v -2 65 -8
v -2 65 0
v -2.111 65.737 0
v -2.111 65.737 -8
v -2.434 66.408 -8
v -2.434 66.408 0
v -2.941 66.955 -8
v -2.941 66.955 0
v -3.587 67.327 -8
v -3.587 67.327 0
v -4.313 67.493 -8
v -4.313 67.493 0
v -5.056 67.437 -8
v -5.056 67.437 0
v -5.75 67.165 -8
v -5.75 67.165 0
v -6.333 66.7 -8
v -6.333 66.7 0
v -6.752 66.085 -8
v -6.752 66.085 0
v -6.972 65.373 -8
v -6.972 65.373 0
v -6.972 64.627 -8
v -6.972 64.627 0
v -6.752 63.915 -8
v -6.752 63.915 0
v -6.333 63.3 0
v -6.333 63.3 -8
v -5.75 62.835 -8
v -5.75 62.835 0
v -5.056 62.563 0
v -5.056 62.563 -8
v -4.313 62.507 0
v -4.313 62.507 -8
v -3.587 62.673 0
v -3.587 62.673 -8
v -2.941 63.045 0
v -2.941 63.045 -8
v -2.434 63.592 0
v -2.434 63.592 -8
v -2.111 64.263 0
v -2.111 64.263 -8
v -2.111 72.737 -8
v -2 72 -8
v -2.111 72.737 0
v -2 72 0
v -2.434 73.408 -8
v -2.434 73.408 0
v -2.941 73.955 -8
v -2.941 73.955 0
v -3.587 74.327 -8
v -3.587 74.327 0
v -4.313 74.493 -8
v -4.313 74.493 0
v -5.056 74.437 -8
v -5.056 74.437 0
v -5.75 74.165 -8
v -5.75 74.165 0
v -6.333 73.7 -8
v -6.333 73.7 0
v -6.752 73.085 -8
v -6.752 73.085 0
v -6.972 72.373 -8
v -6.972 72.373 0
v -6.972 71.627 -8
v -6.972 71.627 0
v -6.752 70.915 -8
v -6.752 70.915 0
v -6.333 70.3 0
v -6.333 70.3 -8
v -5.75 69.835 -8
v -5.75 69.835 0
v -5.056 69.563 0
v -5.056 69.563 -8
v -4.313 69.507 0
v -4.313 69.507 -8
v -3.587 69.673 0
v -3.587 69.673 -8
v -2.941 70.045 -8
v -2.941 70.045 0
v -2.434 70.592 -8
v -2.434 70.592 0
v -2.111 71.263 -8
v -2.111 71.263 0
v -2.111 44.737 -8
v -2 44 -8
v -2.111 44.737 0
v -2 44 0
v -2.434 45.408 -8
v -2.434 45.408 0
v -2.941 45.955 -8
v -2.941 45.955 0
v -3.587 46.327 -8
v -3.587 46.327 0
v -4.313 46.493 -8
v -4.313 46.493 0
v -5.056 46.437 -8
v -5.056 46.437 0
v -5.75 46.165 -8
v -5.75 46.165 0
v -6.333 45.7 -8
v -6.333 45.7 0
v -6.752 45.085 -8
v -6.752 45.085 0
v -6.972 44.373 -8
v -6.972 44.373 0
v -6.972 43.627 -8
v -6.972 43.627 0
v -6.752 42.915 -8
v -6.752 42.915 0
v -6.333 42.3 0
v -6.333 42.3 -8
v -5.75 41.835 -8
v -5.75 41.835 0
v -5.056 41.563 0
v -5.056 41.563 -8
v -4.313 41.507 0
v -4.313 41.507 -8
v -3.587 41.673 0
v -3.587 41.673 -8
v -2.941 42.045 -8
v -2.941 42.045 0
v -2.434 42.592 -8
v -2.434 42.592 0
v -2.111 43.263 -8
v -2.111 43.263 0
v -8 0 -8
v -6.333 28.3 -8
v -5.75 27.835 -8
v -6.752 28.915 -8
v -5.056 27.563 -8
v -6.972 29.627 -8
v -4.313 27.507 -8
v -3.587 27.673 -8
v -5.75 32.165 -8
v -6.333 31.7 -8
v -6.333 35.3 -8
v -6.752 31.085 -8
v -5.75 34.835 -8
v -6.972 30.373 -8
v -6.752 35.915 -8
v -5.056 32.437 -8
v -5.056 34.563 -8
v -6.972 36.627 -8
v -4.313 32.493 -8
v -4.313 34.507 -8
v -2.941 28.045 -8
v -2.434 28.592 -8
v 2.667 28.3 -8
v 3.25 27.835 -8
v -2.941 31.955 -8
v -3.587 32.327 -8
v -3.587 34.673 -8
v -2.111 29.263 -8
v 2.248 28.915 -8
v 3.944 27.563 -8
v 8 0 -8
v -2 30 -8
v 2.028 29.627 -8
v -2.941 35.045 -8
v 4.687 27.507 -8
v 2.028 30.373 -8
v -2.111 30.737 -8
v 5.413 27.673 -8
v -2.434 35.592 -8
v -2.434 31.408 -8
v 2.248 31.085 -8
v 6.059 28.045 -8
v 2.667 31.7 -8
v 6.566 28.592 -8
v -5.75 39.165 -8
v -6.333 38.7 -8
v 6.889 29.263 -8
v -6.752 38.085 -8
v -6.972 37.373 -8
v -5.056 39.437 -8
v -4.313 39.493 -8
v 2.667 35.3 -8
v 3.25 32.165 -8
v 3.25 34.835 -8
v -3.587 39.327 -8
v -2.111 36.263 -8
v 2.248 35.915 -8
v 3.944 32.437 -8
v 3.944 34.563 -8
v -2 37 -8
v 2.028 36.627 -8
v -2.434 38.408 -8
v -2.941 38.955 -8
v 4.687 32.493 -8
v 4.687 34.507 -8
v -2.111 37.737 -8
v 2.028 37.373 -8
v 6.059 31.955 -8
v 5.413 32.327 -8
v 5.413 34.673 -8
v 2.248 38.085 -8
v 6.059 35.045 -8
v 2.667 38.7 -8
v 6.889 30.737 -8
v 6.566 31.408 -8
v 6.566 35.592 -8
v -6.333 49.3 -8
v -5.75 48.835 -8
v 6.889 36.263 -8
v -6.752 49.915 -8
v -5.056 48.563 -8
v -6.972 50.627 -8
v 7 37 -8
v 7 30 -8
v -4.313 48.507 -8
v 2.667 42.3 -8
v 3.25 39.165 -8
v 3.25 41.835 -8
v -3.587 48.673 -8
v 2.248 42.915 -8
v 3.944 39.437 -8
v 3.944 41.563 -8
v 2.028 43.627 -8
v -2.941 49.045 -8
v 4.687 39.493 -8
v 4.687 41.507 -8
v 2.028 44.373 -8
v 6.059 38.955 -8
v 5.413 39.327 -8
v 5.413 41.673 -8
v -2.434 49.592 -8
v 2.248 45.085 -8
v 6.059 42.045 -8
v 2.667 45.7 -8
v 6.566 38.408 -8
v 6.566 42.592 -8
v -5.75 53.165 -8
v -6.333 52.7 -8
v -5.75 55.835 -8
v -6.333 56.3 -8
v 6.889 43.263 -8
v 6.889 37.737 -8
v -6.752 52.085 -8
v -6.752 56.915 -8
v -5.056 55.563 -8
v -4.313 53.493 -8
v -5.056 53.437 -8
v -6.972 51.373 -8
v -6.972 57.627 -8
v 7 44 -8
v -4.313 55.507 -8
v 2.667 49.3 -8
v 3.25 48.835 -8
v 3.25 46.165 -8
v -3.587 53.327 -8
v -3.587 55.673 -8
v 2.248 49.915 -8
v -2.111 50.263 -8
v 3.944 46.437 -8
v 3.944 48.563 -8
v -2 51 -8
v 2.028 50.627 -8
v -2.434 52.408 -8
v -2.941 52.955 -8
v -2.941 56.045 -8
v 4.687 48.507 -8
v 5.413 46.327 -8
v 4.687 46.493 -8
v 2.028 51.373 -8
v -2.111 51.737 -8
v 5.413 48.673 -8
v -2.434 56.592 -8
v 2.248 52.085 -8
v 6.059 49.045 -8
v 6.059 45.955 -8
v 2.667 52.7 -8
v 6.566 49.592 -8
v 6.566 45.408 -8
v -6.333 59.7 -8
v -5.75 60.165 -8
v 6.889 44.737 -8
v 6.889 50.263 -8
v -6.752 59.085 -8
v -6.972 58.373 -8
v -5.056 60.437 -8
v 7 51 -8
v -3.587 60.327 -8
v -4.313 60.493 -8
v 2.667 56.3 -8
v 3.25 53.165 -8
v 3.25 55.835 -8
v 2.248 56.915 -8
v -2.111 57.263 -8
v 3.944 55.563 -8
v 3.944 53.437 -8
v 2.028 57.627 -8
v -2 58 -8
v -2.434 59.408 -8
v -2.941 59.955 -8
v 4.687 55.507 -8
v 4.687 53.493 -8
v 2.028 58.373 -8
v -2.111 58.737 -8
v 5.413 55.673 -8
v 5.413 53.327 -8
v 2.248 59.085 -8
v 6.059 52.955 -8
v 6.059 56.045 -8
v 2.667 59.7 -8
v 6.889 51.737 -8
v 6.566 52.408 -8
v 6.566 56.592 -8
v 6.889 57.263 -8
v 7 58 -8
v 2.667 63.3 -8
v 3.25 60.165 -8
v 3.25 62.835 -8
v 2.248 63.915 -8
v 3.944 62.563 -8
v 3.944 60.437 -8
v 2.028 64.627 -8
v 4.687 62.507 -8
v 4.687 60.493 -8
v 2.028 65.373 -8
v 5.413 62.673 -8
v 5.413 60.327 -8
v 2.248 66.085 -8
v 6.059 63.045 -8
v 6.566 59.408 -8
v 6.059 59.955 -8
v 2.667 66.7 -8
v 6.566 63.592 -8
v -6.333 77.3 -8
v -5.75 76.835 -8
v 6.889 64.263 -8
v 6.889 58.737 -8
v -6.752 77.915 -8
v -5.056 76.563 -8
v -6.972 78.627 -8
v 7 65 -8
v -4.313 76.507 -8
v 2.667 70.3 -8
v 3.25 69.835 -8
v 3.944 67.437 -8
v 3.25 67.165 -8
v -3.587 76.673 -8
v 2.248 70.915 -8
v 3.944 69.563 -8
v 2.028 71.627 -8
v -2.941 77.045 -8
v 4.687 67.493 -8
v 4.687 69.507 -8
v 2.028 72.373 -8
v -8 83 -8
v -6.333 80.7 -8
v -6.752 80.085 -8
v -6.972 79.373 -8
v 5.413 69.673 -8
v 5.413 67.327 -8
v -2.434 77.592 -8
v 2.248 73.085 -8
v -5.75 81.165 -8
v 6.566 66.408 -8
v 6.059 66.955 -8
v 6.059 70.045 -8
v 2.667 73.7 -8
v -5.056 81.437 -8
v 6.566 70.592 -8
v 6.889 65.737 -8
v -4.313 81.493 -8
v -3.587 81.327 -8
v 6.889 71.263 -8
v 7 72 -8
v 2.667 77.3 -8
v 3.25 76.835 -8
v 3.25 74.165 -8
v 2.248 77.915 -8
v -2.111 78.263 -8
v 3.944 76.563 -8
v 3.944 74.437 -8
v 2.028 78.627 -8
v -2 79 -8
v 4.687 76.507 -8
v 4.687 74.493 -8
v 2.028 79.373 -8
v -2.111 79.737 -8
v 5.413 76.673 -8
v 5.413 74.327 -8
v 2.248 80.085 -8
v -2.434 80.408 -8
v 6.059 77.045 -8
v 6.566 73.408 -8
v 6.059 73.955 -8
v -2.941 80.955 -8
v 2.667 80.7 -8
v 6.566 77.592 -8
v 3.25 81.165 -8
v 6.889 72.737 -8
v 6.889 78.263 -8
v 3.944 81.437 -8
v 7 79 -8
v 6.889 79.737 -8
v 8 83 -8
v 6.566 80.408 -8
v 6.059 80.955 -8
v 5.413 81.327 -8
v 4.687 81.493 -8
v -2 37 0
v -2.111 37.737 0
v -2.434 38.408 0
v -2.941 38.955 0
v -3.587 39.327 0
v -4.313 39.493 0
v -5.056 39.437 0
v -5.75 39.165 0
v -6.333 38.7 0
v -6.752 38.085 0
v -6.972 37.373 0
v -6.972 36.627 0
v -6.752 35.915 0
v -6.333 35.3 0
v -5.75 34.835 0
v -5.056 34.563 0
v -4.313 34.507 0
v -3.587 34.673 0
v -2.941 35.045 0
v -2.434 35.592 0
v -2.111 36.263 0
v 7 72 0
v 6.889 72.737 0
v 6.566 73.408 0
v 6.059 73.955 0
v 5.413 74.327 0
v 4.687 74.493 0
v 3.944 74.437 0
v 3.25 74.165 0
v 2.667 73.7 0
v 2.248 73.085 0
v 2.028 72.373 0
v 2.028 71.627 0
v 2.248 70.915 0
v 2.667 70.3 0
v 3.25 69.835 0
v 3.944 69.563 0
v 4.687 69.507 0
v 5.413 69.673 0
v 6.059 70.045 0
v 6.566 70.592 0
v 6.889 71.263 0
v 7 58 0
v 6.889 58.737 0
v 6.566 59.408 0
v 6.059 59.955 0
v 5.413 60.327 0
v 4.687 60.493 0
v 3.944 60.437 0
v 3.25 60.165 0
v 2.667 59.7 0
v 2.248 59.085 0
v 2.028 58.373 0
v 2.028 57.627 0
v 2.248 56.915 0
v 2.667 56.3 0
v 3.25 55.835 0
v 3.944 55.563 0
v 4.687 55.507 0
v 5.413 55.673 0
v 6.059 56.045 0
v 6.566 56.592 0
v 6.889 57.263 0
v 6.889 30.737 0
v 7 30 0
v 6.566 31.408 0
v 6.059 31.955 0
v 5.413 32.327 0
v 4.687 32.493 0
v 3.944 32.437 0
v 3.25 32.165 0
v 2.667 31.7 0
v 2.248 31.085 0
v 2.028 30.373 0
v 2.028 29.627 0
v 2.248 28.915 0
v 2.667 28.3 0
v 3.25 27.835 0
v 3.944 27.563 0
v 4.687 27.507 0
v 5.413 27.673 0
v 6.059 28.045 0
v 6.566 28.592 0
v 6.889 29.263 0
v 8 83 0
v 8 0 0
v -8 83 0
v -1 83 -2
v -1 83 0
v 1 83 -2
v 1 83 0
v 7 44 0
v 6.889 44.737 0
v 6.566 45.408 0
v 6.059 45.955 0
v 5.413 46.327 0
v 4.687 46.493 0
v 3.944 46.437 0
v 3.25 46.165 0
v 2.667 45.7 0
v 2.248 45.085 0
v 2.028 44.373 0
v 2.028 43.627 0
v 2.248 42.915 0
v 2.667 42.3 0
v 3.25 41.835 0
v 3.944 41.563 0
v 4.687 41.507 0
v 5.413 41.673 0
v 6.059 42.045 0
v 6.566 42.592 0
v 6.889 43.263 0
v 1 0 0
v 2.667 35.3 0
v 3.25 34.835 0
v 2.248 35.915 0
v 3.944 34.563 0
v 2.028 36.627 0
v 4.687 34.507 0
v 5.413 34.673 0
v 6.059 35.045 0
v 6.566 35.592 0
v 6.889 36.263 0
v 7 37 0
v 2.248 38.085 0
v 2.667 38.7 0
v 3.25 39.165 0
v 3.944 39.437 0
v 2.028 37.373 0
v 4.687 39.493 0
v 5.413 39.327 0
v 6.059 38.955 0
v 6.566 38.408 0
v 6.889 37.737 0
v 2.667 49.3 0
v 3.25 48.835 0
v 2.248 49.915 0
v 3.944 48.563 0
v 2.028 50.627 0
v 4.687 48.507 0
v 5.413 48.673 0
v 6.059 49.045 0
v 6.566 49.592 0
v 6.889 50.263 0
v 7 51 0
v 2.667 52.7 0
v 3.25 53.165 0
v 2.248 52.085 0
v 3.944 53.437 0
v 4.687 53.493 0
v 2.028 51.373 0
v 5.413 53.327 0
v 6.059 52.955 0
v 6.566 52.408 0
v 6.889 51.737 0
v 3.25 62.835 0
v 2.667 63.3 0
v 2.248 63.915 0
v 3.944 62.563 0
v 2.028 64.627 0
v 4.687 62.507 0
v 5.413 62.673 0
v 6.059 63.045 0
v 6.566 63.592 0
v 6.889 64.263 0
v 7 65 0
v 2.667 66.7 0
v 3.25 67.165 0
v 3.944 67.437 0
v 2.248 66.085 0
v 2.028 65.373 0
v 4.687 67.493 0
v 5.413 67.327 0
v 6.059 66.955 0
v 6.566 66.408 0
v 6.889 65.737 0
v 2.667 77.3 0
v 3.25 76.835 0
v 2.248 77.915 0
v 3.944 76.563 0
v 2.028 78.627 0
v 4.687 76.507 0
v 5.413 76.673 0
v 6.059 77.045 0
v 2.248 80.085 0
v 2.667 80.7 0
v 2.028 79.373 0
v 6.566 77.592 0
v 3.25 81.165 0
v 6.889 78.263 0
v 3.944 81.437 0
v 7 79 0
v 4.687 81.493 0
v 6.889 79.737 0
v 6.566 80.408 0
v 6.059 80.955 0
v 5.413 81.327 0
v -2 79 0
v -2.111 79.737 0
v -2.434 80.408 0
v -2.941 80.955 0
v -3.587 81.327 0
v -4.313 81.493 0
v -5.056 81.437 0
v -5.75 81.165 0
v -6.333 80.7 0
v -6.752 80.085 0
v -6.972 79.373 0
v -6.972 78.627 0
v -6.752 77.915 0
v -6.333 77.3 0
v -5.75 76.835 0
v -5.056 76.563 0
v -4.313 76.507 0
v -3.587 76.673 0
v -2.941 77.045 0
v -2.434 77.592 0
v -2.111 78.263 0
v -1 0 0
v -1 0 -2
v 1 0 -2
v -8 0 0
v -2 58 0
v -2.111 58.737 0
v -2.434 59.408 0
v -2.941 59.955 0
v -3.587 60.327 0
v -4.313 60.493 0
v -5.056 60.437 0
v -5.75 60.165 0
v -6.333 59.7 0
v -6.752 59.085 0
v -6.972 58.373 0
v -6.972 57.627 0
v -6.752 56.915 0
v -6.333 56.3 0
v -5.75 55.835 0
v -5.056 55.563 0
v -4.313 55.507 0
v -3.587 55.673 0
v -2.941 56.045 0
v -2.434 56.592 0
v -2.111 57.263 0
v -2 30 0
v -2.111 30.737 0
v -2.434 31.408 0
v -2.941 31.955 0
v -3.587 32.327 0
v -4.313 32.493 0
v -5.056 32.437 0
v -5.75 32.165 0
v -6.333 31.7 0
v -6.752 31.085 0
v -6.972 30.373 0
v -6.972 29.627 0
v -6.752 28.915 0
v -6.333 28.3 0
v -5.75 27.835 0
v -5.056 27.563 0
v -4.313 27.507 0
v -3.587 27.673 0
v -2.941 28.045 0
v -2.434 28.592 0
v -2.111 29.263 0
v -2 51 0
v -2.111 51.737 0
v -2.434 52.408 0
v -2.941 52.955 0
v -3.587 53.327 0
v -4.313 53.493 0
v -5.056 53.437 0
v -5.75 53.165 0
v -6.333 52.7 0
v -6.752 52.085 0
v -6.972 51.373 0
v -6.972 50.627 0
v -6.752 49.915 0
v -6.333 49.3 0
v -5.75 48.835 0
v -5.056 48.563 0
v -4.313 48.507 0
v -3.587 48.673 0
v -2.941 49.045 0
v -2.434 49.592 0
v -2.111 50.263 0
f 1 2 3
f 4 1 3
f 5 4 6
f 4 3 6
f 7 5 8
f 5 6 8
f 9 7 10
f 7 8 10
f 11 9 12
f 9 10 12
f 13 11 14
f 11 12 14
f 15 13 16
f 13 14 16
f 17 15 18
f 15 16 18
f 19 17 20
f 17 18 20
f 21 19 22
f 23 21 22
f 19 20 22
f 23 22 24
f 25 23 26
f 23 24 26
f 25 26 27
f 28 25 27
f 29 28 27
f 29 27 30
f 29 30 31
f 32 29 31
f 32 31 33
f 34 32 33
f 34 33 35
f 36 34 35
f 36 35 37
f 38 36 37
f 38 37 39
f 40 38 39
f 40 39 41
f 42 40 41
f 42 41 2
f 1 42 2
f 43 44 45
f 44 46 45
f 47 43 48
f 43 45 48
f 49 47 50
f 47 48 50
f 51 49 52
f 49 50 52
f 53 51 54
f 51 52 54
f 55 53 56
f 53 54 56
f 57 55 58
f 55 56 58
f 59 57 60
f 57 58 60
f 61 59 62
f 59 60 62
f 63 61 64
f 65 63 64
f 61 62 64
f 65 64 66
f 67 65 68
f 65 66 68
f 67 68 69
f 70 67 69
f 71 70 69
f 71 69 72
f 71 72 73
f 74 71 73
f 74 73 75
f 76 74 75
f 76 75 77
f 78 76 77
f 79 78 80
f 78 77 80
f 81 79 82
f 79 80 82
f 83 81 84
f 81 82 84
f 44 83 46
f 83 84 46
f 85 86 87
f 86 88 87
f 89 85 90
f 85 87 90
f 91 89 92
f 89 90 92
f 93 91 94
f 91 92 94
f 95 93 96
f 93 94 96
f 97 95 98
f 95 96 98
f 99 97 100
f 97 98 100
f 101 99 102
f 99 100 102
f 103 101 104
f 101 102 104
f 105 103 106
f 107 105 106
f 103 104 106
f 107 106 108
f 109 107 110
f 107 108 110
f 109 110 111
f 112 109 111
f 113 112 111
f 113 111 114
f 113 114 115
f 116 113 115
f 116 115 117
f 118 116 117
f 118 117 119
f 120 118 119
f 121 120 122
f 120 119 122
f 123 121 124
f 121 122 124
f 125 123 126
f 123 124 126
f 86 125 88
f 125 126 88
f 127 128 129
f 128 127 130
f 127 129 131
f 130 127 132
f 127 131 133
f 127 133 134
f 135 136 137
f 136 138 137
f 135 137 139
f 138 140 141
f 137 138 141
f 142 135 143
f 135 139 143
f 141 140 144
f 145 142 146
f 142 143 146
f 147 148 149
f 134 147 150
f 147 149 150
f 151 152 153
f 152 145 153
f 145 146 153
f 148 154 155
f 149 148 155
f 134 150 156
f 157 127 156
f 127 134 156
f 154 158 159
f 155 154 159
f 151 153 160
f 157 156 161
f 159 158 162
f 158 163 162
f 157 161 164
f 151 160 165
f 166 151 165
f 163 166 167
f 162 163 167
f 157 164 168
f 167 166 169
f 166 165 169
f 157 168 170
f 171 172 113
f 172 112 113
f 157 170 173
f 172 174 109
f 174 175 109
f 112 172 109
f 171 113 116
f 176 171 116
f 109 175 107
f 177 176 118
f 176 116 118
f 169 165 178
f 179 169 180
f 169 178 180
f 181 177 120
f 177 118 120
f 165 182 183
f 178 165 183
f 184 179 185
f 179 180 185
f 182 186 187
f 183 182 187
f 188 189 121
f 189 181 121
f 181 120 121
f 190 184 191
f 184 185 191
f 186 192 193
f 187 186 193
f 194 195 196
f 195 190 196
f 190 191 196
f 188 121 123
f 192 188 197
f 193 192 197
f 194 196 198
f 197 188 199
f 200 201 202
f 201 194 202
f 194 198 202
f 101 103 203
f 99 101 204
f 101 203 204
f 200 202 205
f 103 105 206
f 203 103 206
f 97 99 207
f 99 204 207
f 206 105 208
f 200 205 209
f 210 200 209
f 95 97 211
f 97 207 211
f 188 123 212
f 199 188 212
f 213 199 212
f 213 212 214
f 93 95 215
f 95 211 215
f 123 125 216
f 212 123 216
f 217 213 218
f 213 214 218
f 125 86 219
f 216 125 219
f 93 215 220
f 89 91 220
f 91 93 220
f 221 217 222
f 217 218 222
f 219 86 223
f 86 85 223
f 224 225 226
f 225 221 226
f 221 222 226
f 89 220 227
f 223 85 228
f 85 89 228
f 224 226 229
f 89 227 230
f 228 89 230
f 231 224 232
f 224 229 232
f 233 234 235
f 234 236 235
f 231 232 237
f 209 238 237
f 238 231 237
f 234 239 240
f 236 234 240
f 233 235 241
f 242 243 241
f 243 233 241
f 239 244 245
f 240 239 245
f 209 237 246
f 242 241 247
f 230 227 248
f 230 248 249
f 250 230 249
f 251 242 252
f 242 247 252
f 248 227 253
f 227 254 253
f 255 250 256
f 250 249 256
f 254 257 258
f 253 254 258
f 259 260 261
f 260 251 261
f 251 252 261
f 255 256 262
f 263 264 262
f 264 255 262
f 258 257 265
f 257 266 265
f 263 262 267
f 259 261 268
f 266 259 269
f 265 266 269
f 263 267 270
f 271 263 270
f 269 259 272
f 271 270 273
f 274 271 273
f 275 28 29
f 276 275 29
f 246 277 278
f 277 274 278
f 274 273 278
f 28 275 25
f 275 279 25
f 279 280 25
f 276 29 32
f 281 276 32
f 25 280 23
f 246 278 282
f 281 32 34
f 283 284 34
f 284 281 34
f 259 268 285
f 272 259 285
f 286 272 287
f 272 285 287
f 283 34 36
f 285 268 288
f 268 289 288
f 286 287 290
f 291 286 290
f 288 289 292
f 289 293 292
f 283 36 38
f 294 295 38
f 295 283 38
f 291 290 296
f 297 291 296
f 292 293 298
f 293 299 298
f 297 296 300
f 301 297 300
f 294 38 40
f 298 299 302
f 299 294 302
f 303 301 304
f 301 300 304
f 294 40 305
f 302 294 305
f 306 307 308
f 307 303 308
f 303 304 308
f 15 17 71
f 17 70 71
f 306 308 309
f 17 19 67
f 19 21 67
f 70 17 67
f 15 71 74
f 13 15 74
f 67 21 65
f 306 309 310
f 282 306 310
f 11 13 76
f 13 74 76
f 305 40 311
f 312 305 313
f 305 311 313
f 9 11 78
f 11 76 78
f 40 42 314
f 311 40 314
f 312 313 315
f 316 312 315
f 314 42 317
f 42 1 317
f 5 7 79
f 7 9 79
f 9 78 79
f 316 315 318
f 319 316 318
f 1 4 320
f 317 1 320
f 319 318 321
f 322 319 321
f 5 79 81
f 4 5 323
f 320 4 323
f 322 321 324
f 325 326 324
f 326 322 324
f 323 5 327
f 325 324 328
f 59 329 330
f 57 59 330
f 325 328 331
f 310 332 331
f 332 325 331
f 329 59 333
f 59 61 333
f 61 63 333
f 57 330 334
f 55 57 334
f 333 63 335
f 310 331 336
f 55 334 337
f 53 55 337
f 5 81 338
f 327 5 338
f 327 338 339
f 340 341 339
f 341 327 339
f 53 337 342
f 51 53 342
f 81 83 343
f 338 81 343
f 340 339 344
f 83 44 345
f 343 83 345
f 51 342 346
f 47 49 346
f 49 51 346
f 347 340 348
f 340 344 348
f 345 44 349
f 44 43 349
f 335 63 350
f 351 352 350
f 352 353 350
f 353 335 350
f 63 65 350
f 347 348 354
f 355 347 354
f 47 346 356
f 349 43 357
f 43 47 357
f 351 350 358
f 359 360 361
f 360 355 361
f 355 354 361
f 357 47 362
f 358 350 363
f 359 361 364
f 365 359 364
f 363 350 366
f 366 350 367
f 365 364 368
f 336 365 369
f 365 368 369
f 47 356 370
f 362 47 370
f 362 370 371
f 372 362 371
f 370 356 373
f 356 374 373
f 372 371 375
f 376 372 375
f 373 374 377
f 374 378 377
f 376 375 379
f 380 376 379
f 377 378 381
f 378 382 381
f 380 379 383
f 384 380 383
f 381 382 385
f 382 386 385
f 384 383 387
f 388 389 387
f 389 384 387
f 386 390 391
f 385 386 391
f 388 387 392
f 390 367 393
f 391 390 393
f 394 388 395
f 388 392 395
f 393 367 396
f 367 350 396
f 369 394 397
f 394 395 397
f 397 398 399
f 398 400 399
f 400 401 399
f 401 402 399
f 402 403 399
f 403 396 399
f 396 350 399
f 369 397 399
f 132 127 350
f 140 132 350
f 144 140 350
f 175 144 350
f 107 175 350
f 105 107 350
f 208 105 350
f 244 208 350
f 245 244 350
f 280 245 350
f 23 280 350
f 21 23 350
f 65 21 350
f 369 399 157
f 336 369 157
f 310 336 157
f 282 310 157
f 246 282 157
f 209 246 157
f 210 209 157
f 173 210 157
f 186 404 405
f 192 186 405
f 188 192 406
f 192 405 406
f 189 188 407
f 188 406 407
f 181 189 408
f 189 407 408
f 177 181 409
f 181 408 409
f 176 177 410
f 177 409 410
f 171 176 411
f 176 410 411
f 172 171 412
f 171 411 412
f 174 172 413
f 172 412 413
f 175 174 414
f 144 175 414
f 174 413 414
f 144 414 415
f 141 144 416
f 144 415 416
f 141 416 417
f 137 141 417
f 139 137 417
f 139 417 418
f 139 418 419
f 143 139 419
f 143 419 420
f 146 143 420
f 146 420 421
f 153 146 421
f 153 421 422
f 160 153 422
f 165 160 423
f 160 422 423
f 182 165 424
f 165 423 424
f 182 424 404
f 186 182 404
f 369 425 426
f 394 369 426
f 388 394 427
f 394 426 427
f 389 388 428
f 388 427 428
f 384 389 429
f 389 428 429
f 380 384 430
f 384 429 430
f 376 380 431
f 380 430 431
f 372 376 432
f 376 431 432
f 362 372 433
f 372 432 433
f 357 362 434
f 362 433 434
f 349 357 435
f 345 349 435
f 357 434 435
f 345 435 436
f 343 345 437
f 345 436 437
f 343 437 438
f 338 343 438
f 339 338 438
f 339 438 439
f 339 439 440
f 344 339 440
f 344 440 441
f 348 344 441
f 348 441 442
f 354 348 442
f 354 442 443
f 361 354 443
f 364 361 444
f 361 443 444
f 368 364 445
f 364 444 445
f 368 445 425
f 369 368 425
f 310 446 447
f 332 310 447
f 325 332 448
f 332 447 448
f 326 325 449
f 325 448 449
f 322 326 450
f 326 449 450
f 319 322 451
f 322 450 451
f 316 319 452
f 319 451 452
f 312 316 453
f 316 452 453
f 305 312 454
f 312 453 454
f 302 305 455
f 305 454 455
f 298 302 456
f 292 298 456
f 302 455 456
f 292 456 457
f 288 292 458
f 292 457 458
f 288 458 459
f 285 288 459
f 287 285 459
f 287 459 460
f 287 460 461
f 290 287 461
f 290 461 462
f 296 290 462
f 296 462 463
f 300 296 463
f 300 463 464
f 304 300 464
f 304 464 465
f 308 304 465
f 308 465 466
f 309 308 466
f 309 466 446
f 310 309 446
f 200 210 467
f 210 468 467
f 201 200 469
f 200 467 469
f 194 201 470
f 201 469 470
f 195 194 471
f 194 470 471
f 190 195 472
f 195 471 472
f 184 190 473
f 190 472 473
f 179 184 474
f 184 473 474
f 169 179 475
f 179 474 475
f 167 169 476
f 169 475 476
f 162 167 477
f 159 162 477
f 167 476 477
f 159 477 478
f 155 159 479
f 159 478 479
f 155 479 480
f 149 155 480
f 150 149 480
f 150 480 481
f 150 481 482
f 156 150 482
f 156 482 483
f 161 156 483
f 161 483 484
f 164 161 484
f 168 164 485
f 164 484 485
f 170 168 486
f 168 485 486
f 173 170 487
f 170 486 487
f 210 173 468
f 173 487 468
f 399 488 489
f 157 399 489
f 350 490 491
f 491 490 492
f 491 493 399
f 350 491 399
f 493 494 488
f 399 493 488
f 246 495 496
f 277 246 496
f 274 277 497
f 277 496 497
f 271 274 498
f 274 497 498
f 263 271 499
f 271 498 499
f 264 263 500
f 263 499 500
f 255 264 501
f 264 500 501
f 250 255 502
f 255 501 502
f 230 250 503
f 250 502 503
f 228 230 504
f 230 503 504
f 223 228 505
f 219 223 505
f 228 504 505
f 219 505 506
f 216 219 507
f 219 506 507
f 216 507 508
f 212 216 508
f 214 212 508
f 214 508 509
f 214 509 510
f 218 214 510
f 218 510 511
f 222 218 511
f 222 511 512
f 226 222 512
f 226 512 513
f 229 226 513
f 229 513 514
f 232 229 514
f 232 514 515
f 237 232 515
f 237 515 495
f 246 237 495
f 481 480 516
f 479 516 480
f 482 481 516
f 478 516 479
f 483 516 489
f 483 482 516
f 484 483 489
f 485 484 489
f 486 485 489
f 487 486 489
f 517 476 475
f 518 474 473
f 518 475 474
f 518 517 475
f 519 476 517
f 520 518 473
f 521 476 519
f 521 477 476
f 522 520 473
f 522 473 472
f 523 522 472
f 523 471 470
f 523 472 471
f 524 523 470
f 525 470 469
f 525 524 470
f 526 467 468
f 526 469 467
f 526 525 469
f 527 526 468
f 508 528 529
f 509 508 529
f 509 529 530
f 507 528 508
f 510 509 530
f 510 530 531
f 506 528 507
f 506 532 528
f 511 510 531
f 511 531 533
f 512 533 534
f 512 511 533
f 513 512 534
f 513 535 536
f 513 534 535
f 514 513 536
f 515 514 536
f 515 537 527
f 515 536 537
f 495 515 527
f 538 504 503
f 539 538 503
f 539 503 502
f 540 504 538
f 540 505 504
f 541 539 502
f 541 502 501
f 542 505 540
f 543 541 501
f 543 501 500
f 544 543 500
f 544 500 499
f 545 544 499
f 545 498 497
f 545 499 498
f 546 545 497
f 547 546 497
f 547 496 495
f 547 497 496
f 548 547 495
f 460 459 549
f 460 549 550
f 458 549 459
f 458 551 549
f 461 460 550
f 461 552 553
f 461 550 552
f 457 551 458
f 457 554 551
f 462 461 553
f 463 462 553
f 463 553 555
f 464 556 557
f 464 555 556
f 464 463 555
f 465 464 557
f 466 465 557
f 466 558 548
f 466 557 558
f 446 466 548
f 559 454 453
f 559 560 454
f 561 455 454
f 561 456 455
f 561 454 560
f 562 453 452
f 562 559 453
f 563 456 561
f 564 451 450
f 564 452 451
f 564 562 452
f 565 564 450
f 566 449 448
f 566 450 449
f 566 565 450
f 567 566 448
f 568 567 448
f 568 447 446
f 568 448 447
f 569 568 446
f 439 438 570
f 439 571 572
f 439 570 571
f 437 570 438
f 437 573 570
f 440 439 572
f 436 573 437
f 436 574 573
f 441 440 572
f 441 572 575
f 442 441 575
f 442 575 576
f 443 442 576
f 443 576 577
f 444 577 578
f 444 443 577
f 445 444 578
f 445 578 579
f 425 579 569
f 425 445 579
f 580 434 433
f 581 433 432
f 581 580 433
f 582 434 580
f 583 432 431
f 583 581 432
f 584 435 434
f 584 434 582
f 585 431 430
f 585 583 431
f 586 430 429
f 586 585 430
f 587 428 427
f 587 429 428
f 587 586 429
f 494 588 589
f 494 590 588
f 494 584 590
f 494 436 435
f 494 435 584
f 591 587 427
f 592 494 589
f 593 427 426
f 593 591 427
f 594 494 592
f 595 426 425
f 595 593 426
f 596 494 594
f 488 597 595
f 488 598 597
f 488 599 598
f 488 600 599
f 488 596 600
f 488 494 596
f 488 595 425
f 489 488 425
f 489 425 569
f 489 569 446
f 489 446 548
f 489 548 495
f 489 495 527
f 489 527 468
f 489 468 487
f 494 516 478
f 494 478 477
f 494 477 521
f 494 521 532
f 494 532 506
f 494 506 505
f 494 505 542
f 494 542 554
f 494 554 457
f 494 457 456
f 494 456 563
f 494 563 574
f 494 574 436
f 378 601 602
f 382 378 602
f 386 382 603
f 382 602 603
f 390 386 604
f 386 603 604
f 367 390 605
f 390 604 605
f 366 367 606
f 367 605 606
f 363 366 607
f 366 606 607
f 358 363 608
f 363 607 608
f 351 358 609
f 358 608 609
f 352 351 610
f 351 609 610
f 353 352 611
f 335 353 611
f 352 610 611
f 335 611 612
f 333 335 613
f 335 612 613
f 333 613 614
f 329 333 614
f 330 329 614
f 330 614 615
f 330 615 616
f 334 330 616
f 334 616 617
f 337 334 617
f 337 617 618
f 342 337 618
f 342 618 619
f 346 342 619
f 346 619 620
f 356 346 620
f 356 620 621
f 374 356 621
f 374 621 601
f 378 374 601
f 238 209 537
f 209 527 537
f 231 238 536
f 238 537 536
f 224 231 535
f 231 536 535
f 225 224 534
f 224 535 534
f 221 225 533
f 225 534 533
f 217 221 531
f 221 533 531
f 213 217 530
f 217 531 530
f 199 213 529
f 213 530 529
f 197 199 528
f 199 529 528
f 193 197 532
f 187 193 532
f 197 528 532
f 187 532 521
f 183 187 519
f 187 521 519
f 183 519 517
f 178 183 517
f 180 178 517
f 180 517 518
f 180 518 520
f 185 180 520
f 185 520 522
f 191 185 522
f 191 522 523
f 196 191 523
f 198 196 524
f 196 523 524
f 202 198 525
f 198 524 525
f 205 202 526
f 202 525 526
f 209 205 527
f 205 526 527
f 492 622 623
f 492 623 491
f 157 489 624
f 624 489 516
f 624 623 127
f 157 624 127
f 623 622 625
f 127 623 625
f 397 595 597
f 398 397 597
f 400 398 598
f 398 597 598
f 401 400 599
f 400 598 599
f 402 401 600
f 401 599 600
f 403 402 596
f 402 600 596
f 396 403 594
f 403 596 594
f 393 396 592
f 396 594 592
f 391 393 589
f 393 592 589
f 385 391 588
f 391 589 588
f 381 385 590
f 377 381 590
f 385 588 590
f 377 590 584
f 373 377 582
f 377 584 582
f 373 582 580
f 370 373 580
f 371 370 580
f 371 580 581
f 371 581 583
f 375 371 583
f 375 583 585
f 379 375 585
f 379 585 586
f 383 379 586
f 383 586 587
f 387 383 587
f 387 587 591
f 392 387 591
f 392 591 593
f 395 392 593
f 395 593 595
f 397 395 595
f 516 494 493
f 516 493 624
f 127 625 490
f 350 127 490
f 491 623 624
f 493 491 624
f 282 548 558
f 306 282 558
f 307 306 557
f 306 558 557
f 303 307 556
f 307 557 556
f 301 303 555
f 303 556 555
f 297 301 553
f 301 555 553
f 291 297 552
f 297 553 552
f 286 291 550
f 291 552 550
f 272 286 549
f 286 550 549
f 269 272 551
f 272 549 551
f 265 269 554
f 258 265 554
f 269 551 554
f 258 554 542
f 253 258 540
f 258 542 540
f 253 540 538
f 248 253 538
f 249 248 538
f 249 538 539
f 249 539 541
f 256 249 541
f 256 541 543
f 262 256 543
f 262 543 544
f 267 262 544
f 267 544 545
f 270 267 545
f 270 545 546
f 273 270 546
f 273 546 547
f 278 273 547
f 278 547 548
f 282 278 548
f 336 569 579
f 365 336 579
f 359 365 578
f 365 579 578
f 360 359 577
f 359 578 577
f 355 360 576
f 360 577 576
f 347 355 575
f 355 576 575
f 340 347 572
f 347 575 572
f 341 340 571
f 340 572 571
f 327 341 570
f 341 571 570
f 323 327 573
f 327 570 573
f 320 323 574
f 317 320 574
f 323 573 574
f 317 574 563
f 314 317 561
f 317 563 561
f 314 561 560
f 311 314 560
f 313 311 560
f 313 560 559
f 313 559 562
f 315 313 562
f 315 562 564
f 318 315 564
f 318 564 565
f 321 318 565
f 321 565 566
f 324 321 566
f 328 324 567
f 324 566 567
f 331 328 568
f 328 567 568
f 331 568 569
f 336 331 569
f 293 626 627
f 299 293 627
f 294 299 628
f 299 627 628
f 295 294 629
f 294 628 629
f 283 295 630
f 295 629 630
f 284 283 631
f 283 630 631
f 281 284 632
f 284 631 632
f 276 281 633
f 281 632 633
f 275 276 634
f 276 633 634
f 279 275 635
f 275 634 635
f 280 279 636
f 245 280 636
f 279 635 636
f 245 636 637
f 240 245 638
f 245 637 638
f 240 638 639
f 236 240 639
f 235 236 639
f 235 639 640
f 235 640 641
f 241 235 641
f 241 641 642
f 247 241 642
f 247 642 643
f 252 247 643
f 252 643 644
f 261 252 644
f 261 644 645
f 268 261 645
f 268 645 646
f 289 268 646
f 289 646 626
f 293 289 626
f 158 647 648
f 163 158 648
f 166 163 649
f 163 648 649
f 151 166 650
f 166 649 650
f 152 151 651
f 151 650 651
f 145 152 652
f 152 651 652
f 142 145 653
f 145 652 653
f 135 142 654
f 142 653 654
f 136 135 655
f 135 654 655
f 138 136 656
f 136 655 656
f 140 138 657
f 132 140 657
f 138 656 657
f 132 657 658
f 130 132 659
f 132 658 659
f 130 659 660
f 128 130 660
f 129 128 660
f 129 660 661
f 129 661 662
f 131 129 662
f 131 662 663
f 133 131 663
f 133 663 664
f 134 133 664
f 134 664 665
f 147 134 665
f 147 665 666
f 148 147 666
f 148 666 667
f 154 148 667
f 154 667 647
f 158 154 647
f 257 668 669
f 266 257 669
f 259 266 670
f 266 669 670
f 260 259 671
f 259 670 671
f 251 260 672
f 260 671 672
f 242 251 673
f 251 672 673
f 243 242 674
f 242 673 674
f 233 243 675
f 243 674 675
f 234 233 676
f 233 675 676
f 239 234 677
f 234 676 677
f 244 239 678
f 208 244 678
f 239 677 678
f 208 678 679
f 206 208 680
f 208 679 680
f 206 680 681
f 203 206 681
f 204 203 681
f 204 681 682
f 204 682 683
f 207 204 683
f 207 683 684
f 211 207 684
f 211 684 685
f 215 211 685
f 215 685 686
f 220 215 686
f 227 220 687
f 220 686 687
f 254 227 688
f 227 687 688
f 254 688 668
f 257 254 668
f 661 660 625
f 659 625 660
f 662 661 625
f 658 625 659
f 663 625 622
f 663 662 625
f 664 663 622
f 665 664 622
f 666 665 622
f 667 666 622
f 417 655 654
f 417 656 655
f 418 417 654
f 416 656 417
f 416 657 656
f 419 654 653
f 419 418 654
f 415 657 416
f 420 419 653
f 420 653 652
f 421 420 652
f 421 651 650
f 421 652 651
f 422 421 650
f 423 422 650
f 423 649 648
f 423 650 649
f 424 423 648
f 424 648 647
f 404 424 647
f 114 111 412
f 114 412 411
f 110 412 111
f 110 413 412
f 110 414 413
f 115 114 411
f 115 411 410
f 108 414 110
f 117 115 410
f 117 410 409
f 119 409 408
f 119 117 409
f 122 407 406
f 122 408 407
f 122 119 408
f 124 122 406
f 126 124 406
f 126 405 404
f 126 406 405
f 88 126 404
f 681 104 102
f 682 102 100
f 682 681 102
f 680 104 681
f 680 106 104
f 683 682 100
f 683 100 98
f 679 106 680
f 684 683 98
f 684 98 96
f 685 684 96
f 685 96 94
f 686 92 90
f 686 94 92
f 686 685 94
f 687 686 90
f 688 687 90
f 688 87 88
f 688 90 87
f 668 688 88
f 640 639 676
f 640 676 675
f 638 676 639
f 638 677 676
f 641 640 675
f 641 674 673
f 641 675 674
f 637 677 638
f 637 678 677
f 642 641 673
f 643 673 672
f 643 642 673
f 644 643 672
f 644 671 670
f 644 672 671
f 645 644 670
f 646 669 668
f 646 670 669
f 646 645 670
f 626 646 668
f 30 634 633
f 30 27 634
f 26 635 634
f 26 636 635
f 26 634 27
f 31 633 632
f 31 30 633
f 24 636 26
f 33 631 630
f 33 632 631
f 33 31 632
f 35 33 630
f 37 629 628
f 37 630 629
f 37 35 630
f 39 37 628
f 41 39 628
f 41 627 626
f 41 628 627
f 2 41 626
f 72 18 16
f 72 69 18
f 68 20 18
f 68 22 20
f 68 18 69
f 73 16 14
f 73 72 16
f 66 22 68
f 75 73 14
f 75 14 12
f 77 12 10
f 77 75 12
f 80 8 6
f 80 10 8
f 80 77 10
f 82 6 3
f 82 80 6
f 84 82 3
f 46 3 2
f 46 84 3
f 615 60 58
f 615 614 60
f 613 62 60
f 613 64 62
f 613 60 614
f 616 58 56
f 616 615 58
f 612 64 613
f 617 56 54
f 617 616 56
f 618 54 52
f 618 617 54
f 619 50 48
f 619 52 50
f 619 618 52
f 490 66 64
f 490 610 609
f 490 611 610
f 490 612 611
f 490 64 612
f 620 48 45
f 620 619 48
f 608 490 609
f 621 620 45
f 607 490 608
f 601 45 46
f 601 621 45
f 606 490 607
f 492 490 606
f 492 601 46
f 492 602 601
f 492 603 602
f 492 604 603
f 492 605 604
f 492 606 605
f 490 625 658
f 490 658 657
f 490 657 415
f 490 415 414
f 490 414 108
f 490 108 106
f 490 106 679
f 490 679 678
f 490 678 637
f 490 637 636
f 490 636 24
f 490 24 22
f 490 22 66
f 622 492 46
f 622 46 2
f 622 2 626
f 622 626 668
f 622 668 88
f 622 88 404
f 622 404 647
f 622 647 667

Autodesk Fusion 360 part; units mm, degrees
sketch "tree" plane through (0, 0, 0) normal (0, 0, 1) x (1, 0, 0)
  line L0 (0, 0) -> (0, 94.3715) construction
  circle A0 centre (-4.5, 30) radius 2.5
  circle A1 centre (4.5, 30) radius 2.5
  circle A2 centre (-4.5, 37) radius 2.5
  circle A3 centre (4.5, 37) radius 2.5
  circle A4 centre (-4.5, 44) radius 2.5
  circle A5 centre (4.5, 44) radius 2.5
  circle A6 centre (-4.5, 51) radius 2.5
  circle A7 centre (4.5, 51) radius 2.5
  circle A8 centre (-4.5, 58) radius 2.5
  circle A9 centre (4.5, 58) radius 2.5
  circle A10 centre (-4.5, 65) radius 2.5
  circle A11 centre (4.5, 65) radius 2.5
  circle A12 centre (-4.5, 72) radius 2.5
  circle A13 centre (4.5, 72) radius 2.5
  circle A14 centre (-4.5, 79) radius 2.5
  circle A15 centre (4.5, 79) radius 2.5
  line L1 (-1, 83) -> (1, 83)
  line L2 (1, 83) -> (1, 0)
  line L3 (1, 0) -> (-1, 0)
  line L4 (-1, 0) -> (-1, 83)
  dimension "d7" = 5
  dimension "d10" = 9
  dimension "d11" = 7
  dimension "d12" = 2
  dimension "d13" = 30
  dimension "d14" = 4
sketch "plate" plane through (0, 0, 0) normal (0, 0, 1) x (1, 0, 0)
  line L0 (-8, 83) -> (8, 83)
  line L1 (8, 83) -> (8, 0)
  line L2 (8, 0) -> (-8, 0)
  line L3 (-8, 0) -> (-8, 83)
  line L4 (0, 0) -> (0, 94.3715)
  point P0 (1, 83)
  dimension "d16" = 8
extrude "Extrude1" add sketch "plate" against normal blind 8
extrude "Extrude2" cut sketch "tree" against normal through all contours A0 | A1 | A2 | A3 | A4 | A5 | A6 | A7 | A8 | A9 | A10 | A11 | A12 | A13 | A14 | A15
extrude "Extrude3" cut sketch "tree" against normal blind 2 contours L1 L2 L3 L4
equation "led_dia = 5 mm"
equation "wire_dia = 2 mm"
equation "led_vspace = 2 mm" comment "Vertical spacing between leds"
equation "led_hspace = 2 mm" comment "horizontal spacing between led and centerline of wire"
equation "wire_bottom_stickout = 30 mm" comment "How far the wire should expand beneath the center of the topmost led"
equation "wire_top_stickout = 4 mm" comment "How far the wire should extend above the center of the topmost led"
equation "d7 = led_dia"
equation "d10 = led_dia + led_hspace + wire_dia"
equation "d11 = led_dia + led_vspace"
equation "d12 = wire_dia"
equation "d13 = wire_bottom_stickout"
equation "d14 = wire_top_stickout"
equation "d16 = led_dia + led_hspace + 1 mm"
